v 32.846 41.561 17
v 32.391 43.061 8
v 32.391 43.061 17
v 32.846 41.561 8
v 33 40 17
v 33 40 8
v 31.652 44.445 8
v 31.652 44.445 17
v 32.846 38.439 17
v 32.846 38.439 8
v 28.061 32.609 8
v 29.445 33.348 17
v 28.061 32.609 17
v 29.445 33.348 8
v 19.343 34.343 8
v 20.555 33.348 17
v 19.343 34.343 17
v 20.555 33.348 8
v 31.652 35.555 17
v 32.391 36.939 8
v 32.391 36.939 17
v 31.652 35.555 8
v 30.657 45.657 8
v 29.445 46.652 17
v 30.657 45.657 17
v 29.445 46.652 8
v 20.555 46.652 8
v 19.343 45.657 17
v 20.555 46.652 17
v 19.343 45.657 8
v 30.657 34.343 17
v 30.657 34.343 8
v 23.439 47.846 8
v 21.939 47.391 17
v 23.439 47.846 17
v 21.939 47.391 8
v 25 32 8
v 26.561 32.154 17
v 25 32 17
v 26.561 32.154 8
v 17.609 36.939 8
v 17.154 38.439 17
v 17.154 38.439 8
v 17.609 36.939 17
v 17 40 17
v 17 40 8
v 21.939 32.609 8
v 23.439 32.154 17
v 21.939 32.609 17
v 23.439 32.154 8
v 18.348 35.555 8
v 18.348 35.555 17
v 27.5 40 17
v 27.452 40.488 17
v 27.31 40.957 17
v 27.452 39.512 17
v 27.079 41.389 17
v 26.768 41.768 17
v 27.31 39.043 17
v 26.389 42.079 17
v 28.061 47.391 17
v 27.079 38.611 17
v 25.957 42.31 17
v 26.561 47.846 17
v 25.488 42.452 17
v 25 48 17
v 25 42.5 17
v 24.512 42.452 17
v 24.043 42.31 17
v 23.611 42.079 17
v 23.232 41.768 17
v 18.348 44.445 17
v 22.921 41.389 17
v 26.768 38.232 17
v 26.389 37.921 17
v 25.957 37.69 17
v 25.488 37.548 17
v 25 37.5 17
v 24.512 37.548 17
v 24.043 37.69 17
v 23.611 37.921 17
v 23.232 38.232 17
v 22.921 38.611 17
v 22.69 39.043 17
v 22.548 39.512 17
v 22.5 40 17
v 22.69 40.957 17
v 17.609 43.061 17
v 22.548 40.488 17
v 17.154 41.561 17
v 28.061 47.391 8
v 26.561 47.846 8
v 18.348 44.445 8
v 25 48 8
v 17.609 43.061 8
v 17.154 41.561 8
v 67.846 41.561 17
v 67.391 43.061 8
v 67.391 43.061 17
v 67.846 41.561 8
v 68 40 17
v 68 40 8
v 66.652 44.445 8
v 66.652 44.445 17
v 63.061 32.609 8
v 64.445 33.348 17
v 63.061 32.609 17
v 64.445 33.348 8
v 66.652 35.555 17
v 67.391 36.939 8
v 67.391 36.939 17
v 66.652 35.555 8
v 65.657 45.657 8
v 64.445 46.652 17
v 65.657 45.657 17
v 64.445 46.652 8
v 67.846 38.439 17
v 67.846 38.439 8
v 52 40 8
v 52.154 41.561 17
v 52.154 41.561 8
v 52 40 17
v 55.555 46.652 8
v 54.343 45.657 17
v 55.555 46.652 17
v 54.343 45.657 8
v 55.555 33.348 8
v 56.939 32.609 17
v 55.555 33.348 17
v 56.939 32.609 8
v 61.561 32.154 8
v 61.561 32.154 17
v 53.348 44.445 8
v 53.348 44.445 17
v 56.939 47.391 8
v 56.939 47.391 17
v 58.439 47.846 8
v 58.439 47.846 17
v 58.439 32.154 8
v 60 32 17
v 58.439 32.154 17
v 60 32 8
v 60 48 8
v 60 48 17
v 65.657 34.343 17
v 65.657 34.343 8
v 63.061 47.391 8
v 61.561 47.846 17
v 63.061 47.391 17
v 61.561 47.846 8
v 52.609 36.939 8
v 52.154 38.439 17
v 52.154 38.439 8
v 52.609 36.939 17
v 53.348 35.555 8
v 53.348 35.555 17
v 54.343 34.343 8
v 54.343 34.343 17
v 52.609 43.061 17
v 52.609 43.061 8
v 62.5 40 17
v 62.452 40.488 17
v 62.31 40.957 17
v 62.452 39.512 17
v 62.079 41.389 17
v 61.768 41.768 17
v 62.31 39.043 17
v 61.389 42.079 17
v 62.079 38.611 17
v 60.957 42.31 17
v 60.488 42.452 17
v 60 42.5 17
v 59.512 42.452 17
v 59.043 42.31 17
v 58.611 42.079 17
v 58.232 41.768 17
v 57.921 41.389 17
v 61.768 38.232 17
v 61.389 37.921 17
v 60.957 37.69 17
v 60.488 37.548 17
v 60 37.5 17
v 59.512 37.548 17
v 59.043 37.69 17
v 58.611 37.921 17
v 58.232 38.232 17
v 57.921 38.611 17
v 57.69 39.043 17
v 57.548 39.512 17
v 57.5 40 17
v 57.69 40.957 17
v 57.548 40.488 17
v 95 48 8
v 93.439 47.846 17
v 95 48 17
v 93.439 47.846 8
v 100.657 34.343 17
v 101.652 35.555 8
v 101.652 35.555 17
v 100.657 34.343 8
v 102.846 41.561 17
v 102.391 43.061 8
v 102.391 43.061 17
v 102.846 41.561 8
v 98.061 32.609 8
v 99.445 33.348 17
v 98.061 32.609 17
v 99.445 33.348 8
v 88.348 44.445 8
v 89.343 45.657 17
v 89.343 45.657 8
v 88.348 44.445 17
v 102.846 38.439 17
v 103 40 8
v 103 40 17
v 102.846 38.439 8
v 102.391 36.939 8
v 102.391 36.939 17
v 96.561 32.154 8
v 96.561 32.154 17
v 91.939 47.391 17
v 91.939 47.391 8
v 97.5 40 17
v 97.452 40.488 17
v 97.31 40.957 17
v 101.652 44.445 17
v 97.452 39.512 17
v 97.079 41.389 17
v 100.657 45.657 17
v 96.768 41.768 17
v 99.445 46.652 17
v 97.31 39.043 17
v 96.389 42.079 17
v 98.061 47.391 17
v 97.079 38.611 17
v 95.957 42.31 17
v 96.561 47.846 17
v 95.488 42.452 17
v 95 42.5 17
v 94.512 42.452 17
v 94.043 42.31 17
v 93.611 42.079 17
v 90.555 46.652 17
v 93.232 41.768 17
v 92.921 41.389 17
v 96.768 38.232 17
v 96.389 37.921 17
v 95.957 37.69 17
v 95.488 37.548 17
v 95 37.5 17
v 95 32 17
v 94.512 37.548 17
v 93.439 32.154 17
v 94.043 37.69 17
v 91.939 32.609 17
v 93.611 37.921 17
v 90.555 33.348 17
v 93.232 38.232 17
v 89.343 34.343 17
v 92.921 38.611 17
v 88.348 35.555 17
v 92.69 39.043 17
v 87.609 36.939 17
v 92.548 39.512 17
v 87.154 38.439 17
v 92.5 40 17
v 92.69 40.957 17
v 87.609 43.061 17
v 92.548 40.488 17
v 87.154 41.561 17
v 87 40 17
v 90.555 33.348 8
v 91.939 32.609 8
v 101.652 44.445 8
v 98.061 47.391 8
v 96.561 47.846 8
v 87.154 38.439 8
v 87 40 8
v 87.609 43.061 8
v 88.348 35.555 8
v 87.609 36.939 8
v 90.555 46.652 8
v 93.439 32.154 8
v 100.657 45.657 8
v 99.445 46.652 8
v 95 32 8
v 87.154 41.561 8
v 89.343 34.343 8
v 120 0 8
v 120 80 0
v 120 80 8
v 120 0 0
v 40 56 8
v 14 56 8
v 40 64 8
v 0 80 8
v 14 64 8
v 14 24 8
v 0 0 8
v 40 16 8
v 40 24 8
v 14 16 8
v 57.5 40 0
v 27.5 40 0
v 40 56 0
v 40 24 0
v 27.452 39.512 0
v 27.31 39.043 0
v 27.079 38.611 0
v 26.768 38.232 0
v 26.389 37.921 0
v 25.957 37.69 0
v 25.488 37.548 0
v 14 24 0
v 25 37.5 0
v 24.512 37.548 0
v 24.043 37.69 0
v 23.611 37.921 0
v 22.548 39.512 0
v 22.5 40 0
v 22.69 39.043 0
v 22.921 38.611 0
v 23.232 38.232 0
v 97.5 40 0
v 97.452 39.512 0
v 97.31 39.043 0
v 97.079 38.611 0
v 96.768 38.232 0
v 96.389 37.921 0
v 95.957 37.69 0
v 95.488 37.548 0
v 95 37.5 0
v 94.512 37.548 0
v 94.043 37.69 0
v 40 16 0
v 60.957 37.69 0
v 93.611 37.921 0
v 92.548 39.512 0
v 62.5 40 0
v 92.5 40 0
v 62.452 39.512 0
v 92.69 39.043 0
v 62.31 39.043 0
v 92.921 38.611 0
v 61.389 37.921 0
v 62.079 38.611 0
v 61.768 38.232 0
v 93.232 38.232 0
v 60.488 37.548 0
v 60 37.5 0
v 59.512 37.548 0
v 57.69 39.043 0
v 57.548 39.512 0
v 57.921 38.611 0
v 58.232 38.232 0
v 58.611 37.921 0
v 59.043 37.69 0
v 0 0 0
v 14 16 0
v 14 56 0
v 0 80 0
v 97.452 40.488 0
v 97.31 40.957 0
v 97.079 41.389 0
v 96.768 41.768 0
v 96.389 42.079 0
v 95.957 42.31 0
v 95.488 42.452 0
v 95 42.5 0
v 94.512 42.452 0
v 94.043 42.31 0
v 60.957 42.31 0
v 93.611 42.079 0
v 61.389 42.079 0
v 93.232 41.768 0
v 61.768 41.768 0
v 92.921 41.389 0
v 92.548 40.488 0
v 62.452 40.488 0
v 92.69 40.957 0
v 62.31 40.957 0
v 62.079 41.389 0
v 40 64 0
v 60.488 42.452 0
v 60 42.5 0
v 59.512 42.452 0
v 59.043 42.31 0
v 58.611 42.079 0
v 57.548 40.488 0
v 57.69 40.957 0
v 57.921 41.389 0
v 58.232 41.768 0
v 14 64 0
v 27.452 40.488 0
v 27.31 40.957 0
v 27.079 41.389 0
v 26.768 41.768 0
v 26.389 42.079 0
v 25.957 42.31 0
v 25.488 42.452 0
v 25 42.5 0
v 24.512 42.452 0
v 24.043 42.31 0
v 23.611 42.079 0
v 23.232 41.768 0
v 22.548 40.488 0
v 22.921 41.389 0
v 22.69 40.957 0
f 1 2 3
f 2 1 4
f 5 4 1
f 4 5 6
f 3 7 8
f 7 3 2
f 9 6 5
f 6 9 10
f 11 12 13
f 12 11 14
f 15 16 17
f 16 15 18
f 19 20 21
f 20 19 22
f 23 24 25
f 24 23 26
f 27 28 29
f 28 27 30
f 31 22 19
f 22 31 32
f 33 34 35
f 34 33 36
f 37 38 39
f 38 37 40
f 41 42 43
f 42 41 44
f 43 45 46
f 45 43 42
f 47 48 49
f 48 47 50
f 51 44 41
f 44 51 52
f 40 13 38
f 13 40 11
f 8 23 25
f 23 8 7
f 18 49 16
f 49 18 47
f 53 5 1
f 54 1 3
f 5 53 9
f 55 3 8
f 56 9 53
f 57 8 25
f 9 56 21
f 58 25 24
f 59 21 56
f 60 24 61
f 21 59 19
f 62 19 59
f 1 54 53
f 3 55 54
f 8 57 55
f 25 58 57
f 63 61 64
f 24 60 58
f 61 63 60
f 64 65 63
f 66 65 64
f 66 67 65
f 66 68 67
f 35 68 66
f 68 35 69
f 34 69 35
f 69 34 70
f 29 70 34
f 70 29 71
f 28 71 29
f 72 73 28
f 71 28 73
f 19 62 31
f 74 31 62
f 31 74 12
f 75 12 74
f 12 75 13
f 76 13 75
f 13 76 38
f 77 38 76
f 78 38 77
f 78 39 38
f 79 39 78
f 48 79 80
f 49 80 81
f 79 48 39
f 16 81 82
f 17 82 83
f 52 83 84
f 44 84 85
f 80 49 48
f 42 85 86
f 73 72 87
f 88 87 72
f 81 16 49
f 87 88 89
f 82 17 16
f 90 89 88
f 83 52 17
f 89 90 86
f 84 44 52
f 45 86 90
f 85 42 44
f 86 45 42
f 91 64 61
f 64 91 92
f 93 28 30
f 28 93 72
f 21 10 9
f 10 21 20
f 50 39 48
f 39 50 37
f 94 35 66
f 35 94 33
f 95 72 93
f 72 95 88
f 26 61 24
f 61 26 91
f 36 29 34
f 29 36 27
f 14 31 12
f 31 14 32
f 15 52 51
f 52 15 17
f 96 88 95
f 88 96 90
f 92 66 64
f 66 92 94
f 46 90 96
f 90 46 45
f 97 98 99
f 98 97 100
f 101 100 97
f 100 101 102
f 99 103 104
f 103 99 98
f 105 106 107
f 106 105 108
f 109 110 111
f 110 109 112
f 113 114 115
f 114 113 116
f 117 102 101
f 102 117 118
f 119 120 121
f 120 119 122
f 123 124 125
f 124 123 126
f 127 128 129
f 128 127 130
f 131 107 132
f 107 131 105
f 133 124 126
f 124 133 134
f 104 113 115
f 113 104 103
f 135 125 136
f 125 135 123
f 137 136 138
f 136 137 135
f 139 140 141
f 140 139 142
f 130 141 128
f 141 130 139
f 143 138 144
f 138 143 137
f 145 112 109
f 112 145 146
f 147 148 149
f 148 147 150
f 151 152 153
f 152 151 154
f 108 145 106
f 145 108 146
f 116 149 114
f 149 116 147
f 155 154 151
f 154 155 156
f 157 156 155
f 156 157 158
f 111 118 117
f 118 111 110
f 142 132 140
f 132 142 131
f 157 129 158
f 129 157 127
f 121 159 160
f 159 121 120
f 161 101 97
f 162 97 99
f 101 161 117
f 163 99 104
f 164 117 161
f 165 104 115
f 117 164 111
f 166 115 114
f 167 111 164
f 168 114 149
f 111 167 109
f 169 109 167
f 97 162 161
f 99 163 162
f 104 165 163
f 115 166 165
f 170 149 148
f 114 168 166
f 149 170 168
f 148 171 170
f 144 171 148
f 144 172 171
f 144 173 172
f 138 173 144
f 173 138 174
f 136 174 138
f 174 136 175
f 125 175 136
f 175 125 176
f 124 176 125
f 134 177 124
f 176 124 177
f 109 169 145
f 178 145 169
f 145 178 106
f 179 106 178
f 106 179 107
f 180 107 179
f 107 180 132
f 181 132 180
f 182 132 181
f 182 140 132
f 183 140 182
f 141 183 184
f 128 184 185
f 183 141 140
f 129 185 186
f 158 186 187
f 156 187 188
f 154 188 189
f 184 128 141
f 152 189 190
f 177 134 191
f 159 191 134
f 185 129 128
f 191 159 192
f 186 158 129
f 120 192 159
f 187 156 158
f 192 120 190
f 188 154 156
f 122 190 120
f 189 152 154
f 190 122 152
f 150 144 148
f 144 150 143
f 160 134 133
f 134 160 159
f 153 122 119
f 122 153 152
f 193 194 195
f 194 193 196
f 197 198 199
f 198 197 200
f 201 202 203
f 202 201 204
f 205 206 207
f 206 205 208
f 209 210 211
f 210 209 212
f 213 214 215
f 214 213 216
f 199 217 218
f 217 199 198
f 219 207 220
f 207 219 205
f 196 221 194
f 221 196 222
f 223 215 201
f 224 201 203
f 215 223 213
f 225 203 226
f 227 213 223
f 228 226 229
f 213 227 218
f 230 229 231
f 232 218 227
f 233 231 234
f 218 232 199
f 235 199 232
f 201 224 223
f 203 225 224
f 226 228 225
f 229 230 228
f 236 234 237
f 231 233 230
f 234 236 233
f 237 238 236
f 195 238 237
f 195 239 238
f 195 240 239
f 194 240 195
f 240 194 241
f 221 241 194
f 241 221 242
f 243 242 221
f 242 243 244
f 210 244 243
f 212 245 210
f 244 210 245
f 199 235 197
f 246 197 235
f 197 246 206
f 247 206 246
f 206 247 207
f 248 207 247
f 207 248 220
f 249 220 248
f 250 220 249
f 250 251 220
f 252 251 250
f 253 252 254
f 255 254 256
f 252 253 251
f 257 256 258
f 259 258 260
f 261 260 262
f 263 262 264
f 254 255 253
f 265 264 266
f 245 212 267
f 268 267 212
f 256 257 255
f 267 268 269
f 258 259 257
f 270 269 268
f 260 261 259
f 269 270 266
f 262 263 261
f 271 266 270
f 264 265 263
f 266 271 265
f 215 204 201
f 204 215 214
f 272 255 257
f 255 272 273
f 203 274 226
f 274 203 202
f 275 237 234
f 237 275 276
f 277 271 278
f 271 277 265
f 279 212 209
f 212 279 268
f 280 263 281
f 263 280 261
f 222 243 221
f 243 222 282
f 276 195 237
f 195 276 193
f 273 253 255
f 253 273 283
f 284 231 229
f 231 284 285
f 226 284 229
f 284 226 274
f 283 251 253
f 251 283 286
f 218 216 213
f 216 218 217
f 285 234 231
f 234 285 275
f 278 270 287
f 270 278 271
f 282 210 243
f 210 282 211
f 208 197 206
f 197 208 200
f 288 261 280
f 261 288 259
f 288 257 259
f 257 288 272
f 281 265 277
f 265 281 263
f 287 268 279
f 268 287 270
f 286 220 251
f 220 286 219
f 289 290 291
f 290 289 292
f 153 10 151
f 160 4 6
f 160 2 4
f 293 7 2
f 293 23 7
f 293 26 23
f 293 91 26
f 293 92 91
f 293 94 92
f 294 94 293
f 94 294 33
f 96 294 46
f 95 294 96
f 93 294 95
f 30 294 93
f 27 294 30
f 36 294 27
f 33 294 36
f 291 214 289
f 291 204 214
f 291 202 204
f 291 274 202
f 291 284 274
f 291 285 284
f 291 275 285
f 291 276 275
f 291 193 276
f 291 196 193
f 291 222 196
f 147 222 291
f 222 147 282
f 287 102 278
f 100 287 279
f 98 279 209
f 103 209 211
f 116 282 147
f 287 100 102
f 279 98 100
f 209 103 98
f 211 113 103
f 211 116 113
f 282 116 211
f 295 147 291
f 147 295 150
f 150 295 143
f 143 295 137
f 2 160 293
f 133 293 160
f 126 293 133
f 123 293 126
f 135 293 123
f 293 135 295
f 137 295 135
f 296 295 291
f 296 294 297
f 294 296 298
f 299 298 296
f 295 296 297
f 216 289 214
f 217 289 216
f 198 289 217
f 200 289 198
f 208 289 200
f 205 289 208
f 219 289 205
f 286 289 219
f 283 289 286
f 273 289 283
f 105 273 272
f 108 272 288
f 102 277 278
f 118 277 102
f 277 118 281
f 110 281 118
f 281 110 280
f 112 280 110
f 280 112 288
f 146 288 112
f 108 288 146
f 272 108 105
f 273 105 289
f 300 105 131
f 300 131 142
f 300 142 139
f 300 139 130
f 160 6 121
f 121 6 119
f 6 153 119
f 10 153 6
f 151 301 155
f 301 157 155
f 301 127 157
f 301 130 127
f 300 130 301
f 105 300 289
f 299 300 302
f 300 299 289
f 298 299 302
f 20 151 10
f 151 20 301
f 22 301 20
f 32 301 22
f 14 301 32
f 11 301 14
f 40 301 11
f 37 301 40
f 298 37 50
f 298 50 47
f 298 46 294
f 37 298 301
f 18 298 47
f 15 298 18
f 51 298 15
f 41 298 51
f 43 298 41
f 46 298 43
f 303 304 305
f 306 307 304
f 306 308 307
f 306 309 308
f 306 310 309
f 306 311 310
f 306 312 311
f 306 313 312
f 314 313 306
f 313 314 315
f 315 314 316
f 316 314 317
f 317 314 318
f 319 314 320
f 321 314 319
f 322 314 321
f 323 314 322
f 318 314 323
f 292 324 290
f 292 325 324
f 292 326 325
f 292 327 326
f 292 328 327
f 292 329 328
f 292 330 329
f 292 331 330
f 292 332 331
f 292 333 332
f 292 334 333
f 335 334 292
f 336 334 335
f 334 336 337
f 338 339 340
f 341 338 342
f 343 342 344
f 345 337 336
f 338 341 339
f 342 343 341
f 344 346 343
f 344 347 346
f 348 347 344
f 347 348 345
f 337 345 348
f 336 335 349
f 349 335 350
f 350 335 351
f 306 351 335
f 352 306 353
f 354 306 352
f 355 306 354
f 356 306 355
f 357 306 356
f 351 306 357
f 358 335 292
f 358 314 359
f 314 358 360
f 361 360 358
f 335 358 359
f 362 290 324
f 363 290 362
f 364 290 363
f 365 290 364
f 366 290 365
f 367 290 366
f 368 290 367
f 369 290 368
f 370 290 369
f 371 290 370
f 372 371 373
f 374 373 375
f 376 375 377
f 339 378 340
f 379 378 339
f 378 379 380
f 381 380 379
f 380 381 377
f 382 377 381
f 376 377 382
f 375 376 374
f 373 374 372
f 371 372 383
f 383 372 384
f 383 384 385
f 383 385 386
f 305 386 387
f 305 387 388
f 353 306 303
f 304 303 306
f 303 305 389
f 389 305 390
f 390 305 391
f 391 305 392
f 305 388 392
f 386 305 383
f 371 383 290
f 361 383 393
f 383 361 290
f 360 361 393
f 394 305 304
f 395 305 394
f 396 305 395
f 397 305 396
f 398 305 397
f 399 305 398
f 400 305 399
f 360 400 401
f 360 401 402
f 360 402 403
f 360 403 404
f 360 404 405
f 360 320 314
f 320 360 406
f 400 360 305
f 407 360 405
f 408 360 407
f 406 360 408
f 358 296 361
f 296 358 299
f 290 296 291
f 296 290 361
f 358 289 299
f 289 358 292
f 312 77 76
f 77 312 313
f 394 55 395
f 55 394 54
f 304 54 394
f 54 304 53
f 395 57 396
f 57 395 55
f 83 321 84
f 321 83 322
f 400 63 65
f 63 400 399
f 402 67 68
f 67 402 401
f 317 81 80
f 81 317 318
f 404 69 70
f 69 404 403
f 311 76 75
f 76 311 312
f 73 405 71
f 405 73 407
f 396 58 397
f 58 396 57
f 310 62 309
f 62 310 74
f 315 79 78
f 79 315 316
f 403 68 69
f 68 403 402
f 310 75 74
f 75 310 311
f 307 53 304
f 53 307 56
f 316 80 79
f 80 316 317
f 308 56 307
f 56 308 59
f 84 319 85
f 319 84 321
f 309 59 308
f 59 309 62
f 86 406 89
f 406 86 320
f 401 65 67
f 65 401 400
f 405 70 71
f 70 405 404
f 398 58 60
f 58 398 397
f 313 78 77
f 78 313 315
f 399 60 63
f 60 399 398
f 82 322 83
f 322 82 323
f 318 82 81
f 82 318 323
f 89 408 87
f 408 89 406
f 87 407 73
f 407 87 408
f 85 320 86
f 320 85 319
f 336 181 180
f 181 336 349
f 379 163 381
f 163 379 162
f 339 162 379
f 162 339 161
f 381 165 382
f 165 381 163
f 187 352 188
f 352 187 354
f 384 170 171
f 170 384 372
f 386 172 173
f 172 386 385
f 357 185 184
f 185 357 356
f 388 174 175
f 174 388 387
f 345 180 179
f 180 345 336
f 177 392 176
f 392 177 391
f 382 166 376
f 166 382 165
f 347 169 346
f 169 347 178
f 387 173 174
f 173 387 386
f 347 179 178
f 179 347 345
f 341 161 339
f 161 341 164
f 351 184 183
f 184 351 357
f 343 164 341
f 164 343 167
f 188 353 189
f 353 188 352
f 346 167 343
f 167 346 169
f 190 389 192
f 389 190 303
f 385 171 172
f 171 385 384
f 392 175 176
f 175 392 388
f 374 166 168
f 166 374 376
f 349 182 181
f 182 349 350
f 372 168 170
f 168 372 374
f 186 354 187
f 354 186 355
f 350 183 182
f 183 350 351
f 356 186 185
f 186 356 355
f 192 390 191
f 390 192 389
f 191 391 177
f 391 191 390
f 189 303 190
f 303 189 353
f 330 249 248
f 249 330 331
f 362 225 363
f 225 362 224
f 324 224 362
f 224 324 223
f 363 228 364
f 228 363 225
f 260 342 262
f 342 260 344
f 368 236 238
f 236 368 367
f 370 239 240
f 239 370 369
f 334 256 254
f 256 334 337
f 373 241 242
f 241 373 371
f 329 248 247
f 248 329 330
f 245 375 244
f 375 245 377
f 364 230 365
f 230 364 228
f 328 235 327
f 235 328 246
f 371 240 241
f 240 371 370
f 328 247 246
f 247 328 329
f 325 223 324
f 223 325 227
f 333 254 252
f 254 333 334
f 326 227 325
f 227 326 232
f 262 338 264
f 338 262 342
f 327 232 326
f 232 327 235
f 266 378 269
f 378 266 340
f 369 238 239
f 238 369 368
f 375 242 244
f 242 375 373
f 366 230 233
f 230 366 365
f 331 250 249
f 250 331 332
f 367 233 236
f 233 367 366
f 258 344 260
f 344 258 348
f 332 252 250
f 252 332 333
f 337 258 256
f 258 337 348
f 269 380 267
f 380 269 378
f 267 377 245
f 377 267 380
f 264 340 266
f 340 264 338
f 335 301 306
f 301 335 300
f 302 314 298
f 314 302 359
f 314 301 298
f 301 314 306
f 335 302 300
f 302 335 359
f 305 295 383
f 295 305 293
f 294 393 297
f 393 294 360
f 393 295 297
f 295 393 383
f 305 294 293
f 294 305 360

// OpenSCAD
$fn = 32;

// ----------------------------------------------------------------------
// Drill jig: three_boss_slot jig
// ----------------------------------------------------------------------

// --- parameters (mm) ---
plate_l = 120;            // plate length, X
plate_w = 80;             // plate width, Y
plate_t = 8;              // plate thickness
boss_d = 16;              // guide boss diameter
boss_h = 10;              // boss height above the plate
guide_d = 5;              // guide hole diameter
boss_pitch = 35;          // boss pitch
slot_w = 8;               // clamp slot width
slot_l = 26;              // clamp slot length
slot_x = 14;              // slot start X

n_boss = 3;  // guide bosses
boss_x0 = (plate_l - (n_boss - 1) * boss_pitch) / 2;  // first boss X
boss_top = plate_t - 1 + boss_h;  // boss crown height
total_h = boss_top;  // overall height

difference() {
  union() {
  cube([plate_l, plate_w, plate_t]);
  for (i = [0 : n_boss - 1])
    translate([boss_x0 + i * boss_pitch, plate_w / 2, plate_t - 1])
      cylinder(h = boss_h, d = boss_d);
  }
  for (i = [0 : n_boss - 1])
    translate([boss_x0 + i * boss_pitch, plate_w / 2, -1])
      cylinder(h = plate_t + boss_h, d = guide_d);
  for (cy = [plate_w * 0.25, plate_w * 0.75])
    translate([slot_x, cy - slot_w / 2, -1])
      cube([slot_l, slot_w, plate_t + 2]);
}
